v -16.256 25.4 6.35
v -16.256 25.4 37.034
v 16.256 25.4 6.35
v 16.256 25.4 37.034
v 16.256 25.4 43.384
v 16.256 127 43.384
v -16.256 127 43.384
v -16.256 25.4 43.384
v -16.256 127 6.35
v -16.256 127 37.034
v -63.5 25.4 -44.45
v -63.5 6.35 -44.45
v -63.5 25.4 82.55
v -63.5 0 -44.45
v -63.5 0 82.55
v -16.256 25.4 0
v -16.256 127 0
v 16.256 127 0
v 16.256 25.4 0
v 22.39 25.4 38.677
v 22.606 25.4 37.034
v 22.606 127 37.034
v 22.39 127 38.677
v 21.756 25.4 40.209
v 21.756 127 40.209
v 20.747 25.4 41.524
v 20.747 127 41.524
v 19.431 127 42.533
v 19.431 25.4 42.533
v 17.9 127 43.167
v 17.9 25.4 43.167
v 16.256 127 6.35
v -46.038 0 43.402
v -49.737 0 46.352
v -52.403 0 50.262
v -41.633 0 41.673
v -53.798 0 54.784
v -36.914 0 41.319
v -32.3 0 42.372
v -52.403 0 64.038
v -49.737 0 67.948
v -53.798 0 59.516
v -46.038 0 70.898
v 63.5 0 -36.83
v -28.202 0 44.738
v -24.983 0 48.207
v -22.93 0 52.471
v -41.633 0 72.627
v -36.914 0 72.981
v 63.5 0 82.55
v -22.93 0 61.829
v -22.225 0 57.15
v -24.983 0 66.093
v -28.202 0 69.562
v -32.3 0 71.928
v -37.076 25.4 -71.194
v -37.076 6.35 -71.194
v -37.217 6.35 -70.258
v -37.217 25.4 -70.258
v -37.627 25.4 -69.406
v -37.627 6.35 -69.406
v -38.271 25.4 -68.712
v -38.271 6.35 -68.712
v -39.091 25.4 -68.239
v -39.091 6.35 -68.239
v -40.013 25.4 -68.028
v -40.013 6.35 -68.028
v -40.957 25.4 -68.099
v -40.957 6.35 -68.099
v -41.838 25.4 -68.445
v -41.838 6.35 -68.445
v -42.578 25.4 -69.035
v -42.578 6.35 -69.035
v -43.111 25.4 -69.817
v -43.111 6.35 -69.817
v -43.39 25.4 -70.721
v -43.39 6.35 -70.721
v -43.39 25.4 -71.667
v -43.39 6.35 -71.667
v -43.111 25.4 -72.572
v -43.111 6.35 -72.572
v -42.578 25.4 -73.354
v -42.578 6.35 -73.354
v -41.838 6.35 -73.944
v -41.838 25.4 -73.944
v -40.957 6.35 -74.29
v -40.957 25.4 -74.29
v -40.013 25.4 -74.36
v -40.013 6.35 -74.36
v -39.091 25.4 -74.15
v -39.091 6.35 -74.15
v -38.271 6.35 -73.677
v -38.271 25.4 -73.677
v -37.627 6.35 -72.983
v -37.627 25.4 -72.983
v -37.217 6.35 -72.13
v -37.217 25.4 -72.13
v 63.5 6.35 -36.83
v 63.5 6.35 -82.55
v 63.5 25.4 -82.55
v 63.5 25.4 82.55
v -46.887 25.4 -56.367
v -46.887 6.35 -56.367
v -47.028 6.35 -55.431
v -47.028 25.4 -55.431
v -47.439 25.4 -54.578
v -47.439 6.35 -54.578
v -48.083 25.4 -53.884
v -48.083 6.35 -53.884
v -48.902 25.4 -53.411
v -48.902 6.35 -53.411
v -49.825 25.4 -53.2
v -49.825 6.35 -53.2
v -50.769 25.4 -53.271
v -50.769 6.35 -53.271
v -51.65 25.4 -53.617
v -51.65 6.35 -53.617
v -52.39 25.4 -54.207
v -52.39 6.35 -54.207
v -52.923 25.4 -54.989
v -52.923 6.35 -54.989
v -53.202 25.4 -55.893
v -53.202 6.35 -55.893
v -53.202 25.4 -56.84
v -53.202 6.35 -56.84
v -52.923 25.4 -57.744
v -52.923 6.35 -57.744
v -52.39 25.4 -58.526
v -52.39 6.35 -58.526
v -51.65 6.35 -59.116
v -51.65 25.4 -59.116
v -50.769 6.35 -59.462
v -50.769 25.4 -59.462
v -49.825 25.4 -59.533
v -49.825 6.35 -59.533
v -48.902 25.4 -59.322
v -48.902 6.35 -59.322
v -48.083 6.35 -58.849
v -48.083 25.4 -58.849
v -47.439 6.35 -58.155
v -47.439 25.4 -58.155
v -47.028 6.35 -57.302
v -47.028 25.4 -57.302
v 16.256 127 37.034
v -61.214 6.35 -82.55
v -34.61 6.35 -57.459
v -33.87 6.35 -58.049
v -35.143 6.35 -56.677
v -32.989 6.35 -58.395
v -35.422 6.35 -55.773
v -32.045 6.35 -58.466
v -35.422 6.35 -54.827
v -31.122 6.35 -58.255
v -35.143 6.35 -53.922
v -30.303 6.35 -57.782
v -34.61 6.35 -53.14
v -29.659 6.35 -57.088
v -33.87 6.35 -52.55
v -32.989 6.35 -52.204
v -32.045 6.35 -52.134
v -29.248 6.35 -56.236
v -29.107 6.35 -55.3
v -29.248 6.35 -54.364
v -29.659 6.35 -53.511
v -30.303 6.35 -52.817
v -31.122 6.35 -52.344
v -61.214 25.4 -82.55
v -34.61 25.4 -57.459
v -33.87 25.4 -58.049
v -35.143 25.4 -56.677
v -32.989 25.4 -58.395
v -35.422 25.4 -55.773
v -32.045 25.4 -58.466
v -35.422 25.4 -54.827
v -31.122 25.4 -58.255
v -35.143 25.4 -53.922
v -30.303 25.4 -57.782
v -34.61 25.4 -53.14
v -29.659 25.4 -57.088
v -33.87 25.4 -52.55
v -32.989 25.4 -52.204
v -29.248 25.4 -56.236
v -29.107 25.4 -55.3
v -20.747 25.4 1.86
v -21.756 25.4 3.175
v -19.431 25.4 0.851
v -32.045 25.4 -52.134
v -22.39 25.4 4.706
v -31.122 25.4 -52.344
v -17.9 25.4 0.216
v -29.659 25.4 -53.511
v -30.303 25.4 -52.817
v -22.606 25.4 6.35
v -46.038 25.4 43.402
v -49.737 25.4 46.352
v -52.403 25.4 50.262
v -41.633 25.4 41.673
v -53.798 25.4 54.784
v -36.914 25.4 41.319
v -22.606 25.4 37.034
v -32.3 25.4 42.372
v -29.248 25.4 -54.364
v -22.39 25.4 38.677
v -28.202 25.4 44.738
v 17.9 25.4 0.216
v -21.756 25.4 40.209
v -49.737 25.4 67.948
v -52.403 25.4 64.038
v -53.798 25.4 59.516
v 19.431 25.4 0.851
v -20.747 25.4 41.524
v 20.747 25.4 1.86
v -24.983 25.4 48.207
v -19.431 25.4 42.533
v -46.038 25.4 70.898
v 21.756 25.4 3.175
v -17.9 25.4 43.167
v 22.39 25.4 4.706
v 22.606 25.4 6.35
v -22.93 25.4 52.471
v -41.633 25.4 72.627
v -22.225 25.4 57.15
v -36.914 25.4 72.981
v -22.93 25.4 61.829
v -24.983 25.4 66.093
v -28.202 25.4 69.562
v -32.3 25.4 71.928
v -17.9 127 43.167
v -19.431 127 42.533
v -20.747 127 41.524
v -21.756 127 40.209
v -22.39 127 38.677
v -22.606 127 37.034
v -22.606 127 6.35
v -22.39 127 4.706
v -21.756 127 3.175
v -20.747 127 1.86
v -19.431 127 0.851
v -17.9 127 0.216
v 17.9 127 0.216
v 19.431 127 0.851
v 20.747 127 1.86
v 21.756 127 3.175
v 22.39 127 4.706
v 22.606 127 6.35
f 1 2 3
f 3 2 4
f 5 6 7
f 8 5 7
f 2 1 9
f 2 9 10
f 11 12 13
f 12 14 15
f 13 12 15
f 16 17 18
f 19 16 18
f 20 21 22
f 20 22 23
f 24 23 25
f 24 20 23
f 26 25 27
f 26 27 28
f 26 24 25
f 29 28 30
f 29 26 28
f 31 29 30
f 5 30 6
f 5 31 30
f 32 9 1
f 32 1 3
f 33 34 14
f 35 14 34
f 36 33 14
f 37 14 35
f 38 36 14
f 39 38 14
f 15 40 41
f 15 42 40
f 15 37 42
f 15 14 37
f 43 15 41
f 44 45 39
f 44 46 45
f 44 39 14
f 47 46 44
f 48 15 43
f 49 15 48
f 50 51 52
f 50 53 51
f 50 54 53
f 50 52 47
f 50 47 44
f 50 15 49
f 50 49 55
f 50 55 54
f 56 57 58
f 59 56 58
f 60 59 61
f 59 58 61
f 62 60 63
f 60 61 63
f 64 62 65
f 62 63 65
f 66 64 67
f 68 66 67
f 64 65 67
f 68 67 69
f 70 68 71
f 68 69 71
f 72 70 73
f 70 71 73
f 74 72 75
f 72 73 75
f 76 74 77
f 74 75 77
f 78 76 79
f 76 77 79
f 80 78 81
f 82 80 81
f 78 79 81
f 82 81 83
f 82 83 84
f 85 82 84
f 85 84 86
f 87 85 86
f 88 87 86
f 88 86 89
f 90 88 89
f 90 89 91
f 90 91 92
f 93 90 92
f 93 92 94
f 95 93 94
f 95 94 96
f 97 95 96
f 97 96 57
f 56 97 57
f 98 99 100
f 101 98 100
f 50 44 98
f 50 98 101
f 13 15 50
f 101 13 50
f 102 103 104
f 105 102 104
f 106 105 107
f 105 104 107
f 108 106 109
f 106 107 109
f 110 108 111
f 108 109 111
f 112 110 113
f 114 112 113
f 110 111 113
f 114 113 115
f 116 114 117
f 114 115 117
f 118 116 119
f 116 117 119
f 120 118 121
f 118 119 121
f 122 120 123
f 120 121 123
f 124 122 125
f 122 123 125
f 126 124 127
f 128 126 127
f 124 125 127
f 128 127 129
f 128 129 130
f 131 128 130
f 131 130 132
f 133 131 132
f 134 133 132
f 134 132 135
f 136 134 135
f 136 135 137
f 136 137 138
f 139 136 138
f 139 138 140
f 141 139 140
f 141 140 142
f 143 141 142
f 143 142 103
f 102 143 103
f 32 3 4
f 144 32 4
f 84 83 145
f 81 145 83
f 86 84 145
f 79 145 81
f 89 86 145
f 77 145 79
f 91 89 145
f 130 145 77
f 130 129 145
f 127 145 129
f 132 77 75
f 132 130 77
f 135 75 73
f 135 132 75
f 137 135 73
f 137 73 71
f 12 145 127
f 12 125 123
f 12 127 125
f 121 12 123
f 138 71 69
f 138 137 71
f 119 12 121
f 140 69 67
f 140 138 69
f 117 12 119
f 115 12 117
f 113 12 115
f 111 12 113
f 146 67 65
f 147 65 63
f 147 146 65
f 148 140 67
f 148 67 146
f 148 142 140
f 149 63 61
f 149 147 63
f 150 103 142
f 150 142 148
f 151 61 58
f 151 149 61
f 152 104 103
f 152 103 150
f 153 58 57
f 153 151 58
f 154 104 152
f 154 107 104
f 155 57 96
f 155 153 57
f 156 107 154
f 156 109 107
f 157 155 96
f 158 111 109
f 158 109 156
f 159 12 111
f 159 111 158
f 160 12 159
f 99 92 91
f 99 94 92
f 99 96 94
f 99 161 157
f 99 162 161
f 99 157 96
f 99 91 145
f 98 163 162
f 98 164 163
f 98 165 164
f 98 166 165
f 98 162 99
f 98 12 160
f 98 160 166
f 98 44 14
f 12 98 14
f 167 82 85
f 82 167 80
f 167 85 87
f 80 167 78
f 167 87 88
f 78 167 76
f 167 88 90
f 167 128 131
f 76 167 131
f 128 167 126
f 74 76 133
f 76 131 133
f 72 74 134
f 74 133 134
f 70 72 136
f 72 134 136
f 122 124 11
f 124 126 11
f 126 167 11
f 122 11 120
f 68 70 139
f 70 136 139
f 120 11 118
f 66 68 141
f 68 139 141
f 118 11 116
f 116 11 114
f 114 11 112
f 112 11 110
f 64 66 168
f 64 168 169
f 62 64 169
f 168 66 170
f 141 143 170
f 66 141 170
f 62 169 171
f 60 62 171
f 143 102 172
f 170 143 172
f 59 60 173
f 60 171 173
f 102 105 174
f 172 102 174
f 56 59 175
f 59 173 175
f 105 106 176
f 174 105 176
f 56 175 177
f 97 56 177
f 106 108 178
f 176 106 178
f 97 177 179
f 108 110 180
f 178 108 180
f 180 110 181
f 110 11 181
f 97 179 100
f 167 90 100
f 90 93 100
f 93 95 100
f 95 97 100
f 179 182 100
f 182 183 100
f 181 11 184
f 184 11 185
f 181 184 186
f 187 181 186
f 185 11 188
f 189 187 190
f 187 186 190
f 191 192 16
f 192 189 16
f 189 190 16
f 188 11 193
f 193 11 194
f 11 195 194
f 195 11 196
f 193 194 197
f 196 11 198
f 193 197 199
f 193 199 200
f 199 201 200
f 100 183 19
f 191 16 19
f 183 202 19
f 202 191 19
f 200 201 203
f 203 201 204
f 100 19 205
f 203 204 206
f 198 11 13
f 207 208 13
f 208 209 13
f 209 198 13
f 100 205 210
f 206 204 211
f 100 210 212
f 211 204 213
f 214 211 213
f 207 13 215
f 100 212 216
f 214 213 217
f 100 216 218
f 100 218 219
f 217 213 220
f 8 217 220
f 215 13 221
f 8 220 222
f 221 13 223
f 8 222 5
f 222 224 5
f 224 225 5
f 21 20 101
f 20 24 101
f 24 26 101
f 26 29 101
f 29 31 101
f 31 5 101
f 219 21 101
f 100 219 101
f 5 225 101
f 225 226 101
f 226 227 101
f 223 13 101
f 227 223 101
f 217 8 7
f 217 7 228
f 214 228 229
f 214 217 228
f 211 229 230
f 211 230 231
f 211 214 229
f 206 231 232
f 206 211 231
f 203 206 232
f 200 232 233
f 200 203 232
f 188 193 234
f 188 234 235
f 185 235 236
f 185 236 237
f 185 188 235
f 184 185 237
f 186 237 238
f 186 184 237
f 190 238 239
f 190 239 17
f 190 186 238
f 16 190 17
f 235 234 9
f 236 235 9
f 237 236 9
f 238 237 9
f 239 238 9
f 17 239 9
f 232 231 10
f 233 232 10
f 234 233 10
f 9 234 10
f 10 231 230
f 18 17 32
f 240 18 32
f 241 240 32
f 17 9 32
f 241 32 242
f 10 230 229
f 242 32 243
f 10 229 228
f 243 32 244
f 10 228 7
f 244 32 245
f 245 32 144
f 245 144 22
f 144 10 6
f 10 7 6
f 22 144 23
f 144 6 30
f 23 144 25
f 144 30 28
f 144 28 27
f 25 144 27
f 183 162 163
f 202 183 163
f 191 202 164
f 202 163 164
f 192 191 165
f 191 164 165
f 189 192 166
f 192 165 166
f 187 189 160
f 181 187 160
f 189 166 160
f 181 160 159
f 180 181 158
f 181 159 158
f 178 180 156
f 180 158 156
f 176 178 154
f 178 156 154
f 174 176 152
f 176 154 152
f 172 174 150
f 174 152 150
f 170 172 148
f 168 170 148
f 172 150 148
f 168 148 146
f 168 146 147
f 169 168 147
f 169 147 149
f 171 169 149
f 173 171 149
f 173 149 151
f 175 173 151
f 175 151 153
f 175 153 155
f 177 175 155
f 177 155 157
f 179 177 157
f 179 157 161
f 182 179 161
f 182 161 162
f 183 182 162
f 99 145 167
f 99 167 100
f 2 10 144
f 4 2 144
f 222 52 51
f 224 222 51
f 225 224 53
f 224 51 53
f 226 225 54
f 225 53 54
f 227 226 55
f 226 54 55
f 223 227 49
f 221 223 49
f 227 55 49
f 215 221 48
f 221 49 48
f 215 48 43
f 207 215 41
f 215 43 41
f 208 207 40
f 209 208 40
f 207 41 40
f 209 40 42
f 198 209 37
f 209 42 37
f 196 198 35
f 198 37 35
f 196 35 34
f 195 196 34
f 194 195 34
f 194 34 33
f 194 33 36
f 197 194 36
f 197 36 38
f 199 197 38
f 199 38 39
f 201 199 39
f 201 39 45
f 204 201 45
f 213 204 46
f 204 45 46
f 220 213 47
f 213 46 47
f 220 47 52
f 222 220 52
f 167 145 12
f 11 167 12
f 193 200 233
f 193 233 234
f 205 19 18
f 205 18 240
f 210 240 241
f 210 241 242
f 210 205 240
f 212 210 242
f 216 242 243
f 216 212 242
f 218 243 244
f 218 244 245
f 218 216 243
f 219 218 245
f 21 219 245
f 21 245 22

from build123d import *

# Parameters (mm, degrees)
F0_W     = 127
F0_H     = 165.1
F0_R     = 15.875
F1_DEPTH = 25.4
F2_R     = 3.175
F3_DEPTH = 6.35
F4_DEPTH = 25.4
F6_DEPTH = 25.4
F7_W     = 32.5129989862
F7_H     = 30.6838553727
F8_DEPTH = 127


with BuildPart() as f1:
    # F0 (on Front) → F1 (new body)
    with BuildSketch(Plane.XZ):
        Rectangle(F0_W, F0_H)
        with Locations((-38.1, 57.15)):
            Circle(F0_R, mode=Mode.SUBTRACT)
    extrude(amount=-F1_DEPTH)

    # F2 (on face) → F3 (cut)
    with BuildSketch(Plane.XZ):
        Polygon((63.5, -36.83), (-63.5, -44.45), (-63.5, -82.55), (63.5, -82.55), align=None)
        with Locations((-40.2505024661, -71.1942345153)):
            Circle(F2_R, mode=Mode.SUBTRACT)
        with Locations((-50.0621663703, -56.3665694452)):
            Circle(F2_R, mode=Mode.SUBTRACT)
        with Locations((-32.2821663703, -55.2997694452)):
            Circle(F2_R, mode=Mode.SUBTRACT)
        with Locations((-50.0621663703, -56.3665694452)):
            Circle(F2_R)
        with Locations((-32.2821663703, -55.2997694452)):
            Circle(F2_R)
        with Locations((-40.2505024661, -71.1942345153)):
            Circle(F2_R)
    extrude(amount=-F3_DEPTH, mode=Mode.SUBTRACT)

    # F2 (on face) → F4 (cut)
    with BuildSketch(Plane.XZ):
        with Locations((-50.0621663703, -56.3665694452)):
            Circle(F2_R)
        with Locations((-32.2821663703, -55.2997694452)):
            Circle(F2_R)
        with Locations((-40.2505024661, -71.1942345153)):
            Circle(F2_R)
    extrude(amount=-F4_DEPTH, mode=Mode.SUBTRACT)

    # F5 (on face) → F6 (cut)
    with BuildSketch(Plane.XZ.offset(-6.35)):
        Polygon((-61.214, -82.55), (-63.5, -44.45), (-63.5, -82.55), align=None)
    extrude(amount=-F6_DEPTH, mode=Mode.SUBTRACT)

    # F7 (on face) → F8 (join)
    with BuildSketch(Plane.XZ):
        with BuildLine():
            Line((-16.2564994931, 0), (16.2564994931, 0))
            ThreePointArc((16.2564994931, 0), (20.7466275537, 1.8598719395), (22.6064994931, 6.35))
            Line((22.6064994931, 6.35), (22.6064994931, 37.0338553727))
            ThreePointArc((22.6064994931, 37.0338553727), (20.7466275537, 41.5239834332), (16.2564994931, 43.3838553727))
            Line((16.2564994931, 43.3838553727), (-16.2564994931, 43.3838553727))
            ThreePointArc((-16.2564994931, 43.3838553727), (-20.7466275537, 41.5239834332), (-22.6064994931, 37.0338553727))
            Line((-22.6064994931, 37.0338553727), (-22.6064994931, 6.35))
            ThreePointArc((-22.6064994931, 6.35), (-20.7466275537, 1.8598719395), (-16.2564994931, 0))
        make_face()
        with Locations((0, 21.6919276863)):
            Rectangle(F7_W, F7_H, mode=Mode.SUBTRACT)
    extrude(amount=-F8_DEPTH)


solid = f1.part
